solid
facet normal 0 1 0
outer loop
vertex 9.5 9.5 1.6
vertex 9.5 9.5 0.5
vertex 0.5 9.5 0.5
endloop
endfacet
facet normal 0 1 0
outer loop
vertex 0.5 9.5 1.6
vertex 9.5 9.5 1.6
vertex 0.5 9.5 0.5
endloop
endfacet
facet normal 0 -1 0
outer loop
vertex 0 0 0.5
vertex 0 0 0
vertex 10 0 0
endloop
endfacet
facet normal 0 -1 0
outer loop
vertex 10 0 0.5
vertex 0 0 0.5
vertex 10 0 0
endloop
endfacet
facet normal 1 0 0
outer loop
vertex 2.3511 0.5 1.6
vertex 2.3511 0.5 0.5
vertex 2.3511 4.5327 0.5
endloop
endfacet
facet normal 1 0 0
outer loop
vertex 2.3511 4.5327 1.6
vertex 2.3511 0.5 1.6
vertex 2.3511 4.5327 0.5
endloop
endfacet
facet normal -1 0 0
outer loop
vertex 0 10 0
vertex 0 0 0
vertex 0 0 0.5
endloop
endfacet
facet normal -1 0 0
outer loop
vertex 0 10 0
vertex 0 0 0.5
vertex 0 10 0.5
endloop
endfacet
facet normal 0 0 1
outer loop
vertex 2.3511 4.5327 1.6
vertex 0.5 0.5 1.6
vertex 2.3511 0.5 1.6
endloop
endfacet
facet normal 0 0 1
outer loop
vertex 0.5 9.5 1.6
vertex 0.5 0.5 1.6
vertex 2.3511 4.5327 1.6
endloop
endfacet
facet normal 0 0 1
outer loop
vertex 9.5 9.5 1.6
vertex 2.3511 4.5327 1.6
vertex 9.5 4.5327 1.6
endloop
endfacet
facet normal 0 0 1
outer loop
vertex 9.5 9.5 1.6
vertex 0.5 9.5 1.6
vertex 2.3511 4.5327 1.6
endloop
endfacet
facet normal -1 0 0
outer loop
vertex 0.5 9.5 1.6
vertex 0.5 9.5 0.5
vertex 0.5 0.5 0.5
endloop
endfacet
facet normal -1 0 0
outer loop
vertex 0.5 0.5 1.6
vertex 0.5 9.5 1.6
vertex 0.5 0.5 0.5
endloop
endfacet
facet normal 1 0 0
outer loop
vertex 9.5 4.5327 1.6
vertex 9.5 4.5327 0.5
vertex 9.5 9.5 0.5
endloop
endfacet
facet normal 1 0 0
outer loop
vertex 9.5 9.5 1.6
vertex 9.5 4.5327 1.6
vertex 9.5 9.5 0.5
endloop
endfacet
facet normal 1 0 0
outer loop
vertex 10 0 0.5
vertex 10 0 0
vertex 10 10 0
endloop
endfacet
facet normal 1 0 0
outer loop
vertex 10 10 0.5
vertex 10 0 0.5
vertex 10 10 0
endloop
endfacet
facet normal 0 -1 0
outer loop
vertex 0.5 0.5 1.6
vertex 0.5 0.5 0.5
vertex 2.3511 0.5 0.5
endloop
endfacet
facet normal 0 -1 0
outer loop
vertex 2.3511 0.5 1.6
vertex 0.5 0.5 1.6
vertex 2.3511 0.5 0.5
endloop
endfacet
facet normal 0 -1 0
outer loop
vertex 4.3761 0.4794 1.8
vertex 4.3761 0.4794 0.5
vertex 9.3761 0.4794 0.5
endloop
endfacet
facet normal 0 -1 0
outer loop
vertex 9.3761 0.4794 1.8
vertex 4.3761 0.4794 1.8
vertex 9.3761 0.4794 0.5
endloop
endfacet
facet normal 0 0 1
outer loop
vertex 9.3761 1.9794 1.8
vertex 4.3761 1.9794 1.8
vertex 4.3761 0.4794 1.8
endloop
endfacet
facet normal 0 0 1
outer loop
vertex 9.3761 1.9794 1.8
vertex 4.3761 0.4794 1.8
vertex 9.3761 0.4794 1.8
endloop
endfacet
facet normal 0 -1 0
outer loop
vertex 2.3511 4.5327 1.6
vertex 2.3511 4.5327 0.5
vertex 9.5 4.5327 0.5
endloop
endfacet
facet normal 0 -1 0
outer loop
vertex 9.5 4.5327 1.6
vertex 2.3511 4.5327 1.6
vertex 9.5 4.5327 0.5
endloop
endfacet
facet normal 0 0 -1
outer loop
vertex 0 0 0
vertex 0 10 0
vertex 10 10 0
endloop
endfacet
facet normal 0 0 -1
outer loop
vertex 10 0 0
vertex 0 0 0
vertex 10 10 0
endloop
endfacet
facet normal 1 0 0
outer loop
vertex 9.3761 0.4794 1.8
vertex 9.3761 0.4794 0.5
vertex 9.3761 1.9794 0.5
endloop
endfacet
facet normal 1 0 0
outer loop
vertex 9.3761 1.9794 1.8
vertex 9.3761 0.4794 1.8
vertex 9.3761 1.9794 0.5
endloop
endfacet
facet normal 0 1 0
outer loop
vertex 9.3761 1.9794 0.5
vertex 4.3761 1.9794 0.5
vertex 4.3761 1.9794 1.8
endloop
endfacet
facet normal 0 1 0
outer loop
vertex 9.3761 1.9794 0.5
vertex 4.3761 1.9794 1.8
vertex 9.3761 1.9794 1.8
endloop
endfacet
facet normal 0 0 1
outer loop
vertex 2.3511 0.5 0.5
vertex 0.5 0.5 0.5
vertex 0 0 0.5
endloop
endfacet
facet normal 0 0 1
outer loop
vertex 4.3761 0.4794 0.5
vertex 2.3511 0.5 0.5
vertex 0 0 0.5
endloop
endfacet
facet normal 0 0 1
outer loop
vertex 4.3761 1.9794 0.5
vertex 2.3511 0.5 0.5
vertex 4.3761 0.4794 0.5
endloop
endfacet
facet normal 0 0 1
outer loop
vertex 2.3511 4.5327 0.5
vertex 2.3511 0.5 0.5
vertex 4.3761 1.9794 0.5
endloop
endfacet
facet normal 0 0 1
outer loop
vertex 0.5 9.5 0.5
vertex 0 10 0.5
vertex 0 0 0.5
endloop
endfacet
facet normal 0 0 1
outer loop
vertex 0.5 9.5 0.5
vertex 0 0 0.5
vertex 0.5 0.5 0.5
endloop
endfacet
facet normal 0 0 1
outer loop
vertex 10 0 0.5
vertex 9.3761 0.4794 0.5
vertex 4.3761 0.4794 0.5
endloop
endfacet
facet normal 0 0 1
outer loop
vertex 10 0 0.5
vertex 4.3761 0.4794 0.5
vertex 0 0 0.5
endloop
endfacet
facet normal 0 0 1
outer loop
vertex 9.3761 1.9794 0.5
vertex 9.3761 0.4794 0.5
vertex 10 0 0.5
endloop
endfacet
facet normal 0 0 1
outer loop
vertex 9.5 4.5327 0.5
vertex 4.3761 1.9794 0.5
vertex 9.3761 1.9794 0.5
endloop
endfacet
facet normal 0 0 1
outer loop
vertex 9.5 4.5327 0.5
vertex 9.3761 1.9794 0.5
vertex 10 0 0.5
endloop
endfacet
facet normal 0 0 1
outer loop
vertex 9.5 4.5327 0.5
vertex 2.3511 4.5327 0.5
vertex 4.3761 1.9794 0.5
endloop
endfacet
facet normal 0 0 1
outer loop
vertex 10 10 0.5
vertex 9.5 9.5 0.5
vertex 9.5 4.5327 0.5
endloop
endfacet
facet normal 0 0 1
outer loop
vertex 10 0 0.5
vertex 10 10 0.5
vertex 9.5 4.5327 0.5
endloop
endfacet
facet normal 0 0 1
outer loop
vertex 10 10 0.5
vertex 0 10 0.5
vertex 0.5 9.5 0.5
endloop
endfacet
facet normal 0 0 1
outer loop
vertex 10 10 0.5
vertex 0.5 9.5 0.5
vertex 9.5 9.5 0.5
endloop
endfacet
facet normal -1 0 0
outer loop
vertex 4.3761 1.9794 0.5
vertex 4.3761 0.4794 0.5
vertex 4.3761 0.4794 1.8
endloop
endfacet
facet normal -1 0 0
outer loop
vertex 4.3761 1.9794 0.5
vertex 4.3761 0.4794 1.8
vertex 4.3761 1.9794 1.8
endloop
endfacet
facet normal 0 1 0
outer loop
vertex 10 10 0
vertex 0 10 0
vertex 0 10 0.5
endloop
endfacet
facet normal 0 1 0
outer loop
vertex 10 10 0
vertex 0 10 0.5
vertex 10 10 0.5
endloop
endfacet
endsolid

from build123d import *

# Parameters (mm, degrees)
F0_W     = 10
F0_H     = 10
F1_DEPTH = 0.5
F3_DEPTH = 1.1
F4_W     = 5
F4_H     = 1.5
F5_DEPTH = 1.3


with BuildPart() as f1:
    # F0 (on Top) → F1 (new body)
    with BuildSketch(Plane.XY):
        with Locations((5, 5)):
            Rectangle(F0_W, F0_H)
    extrude(amount=F1_DEPTH)

    # F2 (on face) → F3 (join)
    with BuildSketch(Plane.XY.offset(0.5)):
        Polygon((0.5, 9.5), (0.5, 0.5), (2.351106, 0.5), (2.351106, 4.532744), (9.5, 4.532744), (9.5, 9.5), align=None)
    extrude(amount=F3_DEPTH)

    # F4 (on face) → F5 (join)
    with BuildSketch(Plane.XY.offset(0.5)):
        with Locations((6.876147, 1.229358)):
            Rectangle(F4_W, F4_H)
    extrude(amount=F5_DEPTH)


solid = f1.part
